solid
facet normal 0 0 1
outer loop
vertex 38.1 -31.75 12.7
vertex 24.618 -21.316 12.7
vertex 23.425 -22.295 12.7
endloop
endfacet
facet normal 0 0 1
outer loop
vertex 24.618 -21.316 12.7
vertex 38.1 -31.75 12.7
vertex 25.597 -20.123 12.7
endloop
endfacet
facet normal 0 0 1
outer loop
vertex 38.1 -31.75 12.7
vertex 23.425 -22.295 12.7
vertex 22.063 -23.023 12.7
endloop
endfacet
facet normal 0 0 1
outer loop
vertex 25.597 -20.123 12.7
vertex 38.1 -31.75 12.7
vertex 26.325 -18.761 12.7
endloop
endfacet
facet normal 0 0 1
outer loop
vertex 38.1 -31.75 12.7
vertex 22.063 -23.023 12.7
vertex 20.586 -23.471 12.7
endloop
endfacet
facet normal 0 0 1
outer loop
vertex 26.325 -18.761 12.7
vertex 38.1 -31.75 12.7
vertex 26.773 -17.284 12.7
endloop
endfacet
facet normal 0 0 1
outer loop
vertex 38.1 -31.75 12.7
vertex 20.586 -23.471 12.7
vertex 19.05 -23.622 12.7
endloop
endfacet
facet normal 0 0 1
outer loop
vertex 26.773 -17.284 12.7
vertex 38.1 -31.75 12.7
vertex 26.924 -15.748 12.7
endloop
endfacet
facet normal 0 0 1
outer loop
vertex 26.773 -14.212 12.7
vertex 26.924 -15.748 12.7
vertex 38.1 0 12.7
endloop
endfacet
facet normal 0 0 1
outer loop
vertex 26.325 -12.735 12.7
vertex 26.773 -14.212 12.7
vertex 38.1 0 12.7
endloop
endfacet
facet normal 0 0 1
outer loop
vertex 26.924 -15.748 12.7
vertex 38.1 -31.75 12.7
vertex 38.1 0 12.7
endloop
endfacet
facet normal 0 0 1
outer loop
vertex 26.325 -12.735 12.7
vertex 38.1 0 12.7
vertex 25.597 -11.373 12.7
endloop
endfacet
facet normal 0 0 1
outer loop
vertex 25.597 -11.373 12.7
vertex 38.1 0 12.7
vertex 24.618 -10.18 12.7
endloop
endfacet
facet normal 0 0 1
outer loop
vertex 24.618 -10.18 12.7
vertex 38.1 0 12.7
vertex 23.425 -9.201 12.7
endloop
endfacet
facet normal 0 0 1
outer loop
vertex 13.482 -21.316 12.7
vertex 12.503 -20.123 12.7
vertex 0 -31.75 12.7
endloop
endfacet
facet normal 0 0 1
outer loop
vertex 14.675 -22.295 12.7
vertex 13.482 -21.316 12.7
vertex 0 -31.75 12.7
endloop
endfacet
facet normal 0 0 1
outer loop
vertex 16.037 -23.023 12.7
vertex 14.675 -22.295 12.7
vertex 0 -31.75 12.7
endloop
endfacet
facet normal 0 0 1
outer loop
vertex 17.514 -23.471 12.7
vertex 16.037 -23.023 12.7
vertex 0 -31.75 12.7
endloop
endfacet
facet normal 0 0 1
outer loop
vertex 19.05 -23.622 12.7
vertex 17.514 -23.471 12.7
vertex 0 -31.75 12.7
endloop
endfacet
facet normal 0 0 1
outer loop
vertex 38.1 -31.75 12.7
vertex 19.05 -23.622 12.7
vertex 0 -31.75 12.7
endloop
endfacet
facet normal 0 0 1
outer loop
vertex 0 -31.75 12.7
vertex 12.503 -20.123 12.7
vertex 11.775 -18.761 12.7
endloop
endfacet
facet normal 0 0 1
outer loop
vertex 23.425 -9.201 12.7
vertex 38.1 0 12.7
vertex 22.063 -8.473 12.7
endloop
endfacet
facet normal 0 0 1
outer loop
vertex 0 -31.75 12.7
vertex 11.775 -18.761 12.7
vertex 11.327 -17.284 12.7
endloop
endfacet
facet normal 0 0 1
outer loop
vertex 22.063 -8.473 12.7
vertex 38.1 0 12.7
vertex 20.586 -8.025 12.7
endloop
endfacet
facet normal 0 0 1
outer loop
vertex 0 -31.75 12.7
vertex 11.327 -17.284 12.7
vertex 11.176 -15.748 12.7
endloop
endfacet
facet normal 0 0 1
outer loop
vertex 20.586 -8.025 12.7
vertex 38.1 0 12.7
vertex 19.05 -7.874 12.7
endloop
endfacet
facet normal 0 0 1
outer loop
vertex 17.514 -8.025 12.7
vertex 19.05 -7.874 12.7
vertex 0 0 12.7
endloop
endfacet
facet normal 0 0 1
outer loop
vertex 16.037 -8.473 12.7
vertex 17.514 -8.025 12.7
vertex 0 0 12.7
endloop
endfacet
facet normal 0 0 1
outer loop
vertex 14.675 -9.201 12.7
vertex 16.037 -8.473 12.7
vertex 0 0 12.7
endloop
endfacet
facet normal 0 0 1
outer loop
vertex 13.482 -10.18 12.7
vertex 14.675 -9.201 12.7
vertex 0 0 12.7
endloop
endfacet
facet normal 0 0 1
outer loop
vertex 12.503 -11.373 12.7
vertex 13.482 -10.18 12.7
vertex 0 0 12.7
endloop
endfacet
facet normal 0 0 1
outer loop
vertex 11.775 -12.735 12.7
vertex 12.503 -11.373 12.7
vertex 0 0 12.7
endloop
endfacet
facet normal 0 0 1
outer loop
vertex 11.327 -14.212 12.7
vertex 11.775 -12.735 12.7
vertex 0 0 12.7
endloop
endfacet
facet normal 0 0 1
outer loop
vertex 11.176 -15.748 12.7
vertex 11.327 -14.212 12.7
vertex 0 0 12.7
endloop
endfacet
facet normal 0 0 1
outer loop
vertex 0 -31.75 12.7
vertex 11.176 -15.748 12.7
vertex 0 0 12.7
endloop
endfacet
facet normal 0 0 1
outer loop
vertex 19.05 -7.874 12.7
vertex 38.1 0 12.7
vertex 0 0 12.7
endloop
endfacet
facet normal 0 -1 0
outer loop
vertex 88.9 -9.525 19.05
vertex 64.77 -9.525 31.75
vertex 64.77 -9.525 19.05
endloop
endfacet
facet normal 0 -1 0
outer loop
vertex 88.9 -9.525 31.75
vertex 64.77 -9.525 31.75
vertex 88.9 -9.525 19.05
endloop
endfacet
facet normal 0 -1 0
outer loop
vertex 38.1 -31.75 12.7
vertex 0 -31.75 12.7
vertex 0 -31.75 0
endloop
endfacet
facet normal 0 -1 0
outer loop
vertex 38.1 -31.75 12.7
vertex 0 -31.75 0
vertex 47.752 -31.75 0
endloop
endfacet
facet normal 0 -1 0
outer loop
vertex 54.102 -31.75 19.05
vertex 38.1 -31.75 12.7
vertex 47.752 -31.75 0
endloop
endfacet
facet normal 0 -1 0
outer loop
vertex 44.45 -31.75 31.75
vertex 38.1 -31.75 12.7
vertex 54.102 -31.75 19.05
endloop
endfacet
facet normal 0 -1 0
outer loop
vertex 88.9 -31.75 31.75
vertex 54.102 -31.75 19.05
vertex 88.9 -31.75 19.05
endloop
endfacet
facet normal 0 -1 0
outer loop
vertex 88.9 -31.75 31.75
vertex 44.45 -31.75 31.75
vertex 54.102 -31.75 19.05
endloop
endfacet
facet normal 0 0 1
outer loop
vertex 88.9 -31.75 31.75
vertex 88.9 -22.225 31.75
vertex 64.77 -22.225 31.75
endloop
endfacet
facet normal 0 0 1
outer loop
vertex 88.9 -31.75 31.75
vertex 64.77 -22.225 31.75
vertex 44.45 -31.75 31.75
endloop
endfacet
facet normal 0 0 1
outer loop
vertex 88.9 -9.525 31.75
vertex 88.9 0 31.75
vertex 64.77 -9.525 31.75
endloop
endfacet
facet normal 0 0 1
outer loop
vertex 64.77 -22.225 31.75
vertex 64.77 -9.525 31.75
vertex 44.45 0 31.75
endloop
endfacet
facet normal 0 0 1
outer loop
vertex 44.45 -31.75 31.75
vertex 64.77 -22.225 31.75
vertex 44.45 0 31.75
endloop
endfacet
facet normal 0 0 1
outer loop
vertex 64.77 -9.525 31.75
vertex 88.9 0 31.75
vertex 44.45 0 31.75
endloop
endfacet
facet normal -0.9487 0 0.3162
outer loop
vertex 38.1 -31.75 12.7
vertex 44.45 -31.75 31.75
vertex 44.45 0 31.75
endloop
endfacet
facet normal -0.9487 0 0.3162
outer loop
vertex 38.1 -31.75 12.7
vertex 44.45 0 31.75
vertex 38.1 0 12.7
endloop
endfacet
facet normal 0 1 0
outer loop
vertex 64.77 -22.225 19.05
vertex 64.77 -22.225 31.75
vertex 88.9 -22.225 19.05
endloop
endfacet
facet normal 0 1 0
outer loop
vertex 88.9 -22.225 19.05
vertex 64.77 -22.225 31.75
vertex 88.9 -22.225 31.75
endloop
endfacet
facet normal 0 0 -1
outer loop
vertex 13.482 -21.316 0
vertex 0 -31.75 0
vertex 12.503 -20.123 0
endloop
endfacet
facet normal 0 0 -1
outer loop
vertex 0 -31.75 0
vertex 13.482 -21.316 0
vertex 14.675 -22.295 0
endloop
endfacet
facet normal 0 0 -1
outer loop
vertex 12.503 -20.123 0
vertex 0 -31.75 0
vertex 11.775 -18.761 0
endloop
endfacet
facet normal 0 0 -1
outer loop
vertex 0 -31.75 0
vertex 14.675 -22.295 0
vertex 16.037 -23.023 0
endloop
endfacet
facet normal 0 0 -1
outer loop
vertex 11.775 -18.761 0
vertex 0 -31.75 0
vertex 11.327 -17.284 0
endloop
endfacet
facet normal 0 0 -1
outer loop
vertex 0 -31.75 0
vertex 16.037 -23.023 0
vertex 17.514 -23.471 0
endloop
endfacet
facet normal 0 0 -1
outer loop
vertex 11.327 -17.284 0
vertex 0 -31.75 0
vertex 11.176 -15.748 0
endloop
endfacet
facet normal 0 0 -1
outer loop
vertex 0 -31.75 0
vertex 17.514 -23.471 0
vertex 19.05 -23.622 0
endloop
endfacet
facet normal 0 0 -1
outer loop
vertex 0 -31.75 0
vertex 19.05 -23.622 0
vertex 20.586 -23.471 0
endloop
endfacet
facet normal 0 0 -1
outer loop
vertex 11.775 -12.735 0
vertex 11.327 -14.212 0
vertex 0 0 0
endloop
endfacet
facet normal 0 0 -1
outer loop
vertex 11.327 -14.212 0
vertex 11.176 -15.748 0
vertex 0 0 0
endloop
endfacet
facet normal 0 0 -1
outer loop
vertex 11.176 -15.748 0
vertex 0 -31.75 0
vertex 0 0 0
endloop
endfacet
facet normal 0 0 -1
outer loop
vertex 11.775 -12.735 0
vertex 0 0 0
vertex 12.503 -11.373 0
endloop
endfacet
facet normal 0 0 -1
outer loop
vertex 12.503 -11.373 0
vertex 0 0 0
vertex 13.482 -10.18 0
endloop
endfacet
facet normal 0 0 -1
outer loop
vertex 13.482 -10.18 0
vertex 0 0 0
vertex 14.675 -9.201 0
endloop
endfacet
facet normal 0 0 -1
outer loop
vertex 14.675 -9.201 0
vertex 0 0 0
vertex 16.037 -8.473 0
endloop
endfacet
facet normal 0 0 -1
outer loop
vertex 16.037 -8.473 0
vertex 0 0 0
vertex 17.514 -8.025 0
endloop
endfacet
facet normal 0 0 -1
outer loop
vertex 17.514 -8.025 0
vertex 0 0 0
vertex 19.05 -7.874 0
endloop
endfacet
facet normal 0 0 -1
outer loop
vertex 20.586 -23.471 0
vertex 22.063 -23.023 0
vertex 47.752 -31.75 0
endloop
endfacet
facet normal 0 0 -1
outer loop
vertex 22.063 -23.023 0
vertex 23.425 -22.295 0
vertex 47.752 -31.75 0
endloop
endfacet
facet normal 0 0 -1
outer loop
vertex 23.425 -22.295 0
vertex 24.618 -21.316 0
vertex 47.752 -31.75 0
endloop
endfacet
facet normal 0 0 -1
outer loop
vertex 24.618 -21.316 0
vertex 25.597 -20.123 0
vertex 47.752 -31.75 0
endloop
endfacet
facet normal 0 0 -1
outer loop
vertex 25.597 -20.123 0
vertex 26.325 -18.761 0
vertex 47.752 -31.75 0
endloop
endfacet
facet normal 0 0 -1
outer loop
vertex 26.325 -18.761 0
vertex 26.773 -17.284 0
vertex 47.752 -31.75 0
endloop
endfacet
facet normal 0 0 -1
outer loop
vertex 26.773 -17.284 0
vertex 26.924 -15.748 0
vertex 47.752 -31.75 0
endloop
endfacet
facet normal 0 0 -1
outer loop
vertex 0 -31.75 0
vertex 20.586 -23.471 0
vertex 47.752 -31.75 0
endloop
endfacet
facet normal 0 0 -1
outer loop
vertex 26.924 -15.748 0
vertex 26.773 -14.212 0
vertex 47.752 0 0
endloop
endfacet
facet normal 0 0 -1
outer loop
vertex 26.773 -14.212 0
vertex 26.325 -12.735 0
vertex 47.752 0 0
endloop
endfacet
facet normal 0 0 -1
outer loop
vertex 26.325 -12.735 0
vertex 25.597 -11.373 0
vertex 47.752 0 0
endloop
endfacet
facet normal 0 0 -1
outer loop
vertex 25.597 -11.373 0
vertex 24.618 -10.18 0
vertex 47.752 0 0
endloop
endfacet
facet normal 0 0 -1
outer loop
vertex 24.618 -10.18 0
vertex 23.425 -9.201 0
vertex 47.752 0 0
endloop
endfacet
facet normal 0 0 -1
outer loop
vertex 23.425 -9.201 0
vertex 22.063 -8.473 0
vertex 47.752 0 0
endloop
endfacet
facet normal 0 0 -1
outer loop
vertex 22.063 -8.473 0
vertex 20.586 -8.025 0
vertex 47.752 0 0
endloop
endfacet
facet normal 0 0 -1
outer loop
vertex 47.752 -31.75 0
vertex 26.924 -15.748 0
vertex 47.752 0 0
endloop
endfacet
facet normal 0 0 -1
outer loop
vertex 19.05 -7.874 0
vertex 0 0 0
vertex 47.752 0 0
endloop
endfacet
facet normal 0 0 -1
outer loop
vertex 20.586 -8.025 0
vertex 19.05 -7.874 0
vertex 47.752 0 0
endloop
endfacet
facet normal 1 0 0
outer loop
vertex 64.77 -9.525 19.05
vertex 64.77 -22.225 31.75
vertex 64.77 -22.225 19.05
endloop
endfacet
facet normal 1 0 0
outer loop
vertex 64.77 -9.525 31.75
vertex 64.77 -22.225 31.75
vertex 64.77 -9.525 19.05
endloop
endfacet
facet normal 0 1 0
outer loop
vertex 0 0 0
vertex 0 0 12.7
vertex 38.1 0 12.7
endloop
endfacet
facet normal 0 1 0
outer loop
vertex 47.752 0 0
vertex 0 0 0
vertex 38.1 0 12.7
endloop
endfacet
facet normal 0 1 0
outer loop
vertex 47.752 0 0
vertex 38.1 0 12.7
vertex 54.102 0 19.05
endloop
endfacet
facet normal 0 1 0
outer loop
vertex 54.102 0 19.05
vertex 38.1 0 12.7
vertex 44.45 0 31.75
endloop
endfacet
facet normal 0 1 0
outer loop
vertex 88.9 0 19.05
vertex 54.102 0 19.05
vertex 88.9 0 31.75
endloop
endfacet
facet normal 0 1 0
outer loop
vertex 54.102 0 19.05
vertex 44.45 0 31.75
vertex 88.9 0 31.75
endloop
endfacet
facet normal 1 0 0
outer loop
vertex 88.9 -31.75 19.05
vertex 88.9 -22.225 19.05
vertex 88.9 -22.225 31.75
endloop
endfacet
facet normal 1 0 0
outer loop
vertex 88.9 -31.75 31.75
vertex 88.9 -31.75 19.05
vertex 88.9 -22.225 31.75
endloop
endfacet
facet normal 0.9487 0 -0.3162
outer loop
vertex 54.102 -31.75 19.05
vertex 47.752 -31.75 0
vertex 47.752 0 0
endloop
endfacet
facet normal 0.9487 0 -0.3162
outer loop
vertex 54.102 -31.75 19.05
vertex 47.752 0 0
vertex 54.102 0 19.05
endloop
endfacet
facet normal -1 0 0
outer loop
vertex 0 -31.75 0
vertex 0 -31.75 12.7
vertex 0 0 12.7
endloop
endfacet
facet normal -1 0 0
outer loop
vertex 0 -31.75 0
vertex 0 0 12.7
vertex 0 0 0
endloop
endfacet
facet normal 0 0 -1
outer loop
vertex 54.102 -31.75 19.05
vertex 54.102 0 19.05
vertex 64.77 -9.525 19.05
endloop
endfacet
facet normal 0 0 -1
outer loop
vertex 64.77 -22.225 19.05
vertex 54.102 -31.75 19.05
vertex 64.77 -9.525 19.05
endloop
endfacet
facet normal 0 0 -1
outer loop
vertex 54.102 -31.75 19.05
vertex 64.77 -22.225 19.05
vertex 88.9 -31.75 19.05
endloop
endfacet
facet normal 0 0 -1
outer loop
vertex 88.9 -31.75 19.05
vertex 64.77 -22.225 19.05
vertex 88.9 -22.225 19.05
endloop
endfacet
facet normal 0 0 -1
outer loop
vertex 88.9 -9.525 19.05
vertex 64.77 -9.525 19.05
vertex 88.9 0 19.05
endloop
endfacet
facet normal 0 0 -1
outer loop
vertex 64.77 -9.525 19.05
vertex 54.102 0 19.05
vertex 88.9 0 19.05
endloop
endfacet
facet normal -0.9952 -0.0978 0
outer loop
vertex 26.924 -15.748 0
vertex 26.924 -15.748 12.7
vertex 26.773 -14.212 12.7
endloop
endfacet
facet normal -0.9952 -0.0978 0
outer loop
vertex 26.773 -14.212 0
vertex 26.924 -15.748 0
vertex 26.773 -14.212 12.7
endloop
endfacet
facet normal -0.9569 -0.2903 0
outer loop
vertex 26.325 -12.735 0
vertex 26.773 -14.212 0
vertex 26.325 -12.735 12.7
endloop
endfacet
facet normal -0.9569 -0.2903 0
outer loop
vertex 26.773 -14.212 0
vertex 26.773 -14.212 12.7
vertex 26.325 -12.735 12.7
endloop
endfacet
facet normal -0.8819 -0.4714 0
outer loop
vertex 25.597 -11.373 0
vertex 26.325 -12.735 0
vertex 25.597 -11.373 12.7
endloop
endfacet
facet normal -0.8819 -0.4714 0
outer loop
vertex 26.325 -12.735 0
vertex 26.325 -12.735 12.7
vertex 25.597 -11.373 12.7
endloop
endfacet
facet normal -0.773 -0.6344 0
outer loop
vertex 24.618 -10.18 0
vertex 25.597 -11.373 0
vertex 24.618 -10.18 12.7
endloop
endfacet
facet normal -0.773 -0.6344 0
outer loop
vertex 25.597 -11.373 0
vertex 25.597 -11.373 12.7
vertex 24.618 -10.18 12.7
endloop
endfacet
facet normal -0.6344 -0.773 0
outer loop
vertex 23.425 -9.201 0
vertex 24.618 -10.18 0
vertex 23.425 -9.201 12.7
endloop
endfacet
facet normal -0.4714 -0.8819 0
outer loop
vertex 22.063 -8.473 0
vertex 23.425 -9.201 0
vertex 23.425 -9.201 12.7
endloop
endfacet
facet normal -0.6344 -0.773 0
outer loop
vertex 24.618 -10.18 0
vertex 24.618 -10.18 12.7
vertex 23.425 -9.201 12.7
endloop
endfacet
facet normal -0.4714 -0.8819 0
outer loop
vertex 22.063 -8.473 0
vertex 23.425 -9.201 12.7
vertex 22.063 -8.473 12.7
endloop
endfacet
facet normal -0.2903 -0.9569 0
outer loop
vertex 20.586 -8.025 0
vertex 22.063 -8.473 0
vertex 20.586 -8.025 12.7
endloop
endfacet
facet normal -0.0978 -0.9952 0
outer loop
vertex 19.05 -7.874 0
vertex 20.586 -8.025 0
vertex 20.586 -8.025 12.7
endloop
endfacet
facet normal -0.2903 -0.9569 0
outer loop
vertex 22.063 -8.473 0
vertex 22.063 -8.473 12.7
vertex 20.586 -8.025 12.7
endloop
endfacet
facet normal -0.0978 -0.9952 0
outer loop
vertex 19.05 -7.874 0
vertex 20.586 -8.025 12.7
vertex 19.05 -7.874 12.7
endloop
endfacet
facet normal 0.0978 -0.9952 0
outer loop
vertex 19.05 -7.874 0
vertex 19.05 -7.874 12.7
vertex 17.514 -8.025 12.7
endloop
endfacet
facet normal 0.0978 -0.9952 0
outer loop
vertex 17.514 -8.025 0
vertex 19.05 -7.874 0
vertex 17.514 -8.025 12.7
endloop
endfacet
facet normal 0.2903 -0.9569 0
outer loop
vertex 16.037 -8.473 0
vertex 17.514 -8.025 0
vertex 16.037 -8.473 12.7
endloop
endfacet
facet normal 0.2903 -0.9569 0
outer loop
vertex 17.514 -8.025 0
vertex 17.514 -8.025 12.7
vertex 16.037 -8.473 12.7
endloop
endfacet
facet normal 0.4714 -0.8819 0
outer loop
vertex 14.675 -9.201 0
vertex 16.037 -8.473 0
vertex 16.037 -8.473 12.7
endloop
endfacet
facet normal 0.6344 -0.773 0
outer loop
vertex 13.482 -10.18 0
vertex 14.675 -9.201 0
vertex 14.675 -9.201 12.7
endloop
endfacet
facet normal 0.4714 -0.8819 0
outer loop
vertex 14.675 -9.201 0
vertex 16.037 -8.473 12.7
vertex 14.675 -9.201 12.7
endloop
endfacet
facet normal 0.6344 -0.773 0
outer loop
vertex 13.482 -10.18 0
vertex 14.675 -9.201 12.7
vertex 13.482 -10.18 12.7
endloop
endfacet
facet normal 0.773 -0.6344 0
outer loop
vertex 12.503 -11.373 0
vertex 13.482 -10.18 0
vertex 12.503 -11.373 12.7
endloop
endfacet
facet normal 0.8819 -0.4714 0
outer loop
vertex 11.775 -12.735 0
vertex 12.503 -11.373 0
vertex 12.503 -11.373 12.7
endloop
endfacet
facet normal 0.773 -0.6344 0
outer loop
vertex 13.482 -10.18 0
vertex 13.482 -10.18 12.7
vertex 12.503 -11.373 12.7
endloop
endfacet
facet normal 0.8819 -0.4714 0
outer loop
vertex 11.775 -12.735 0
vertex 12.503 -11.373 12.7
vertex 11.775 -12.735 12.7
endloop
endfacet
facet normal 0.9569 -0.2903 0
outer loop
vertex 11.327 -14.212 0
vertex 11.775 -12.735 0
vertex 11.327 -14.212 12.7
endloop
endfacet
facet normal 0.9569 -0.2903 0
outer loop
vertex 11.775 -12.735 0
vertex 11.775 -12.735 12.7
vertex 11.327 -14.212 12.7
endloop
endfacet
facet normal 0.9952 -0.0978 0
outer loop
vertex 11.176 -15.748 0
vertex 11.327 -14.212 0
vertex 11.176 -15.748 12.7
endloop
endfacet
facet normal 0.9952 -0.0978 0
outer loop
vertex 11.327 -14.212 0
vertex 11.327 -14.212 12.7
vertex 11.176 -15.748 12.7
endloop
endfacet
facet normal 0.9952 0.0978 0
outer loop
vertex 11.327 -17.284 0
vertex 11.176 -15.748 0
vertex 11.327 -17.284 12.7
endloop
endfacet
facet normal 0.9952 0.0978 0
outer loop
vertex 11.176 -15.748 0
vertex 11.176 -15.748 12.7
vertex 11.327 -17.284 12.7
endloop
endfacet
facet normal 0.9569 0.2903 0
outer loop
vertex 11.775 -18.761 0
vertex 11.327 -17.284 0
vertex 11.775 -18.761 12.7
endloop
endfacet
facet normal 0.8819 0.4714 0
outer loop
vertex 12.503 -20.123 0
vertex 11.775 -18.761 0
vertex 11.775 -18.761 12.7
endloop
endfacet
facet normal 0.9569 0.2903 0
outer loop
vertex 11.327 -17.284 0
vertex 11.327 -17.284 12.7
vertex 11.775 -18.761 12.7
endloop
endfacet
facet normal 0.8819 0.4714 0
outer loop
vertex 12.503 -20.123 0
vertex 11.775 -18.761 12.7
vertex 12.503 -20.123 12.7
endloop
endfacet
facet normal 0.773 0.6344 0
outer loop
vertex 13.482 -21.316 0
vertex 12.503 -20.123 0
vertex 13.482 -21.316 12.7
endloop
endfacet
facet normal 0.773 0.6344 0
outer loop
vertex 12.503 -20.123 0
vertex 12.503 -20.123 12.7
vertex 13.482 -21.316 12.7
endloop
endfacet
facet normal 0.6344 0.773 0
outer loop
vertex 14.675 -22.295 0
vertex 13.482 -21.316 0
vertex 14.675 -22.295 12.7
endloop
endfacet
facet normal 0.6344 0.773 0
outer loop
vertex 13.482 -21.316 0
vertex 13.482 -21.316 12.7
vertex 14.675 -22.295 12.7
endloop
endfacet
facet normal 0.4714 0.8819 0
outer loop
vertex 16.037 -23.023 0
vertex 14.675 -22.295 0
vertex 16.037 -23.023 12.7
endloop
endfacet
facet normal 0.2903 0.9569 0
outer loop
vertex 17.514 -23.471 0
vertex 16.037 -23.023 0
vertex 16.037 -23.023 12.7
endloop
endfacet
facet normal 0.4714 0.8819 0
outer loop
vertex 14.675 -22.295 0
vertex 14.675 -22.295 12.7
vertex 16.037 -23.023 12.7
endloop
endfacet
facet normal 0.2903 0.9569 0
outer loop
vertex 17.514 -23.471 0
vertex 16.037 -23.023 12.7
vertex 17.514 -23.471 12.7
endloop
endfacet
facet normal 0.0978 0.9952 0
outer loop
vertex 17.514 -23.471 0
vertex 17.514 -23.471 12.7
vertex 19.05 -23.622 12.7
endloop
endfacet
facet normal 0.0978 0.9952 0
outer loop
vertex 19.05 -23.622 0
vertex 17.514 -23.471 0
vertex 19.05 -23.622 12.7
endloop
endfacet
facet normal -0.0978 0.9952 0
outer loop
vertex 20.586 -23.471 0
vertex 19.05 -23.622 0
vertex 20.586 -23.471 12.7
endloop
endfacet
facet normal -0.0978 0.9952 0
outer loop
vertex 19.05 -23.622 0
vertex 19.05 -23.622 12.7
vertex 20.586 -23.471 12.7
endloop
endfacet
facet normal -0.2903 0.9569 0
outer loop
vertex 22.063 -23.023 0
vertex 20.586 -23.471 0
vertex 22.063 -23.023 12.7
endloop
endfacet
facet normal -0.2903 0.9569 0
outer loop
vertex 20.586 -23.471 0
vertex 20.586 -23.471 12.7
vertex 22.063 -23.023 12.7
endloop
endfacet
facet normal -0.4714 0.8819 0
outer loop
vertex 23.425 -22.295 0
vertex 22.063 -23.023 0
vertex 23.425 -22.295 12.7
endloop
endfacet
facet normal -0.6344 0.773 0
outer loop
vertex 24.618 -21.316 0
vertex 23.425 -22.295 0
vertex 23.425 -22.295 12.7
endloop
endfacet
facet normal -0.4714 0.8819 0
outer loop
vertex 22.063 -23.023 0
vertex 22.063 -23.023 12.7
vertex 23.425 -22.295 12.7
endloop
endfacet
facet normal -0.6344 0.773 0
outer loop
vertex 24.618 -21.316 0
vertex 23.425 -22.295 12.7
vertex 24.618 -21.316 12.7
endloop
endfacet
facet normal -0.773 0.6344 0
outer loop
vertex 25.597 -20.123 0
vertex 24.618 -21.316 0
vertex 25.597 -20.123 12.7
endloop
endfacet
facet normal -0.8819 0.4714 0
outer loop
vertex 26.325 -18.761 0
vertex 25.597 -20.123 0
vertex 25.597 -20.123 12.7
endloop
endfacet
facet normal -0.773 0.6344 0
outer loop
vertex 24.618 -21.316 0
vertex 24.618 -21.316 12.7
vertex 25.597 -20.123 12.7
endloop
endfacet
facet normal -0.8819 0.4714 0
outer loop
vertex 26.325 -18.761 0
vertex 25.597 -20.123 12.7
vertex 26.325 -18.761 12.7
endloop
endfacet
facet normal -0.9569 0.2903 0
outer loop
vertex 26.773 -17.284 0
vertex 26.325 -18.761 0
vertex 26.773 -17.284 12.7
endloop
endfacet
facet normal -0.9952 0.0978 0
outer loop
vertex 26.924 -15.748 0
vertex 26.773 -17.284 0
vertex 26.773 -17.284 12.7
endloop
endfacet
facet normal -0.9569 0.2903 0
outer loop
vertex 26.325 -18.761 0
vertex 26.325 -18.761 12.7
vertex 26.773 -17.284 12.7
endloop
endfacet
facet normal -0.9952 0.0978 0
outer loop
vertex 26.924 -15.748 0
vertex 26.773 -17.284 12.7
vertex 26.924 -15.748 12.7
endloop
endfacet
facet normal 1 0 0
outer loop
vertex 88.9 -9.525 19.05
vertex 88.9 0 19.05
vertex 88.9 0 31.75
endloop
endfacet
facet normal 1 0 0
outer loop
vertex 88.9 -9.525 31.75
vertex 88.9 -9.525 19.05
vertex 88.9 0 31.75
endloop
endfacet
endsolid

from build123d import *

# Parameters (mm, degrees)
F1_DEPTH = 31.75
F2_W     = 24.130002
F2_H     = 12.7
F3_DEPTH = 12.7
F4_R     = 7.874
F5_DEPTH = 12.7


with BuildPart() as f1:
    # F0 (on Front) → F1 (new body)
    with BuildSketch(Plane.XZ):
        Polygon((0, 12.7), (0, 0), (47.752, 0), (54.102, 19.05), (88.9, 19.05), (88.9, 31.75), (44.45, 31.75), (38.1, 12.7), align=None)
    extrude(amount=F1_DEPTH)

    # F2 (on face) → F3 (cut)
    with BuildSketch(Plane.XY.offset(31.75)):
        with Locations((76.834999, -15.875)):
            Rectangle(F2_W, F2_H)
    extrude(amount=-F3_DEPTH, mode=Mode.SUBTRACT)

    # F4 (on face) → F5 (cut)
    with BuildSketch(Plane.XY.offset(12.7)):
        with Locations((19.05, -15.748)):
            Circle(F4_R)
    extrude(amount=-F5_DEPTH, mode=Mode.SUBTRACT)


solid = f1.part
